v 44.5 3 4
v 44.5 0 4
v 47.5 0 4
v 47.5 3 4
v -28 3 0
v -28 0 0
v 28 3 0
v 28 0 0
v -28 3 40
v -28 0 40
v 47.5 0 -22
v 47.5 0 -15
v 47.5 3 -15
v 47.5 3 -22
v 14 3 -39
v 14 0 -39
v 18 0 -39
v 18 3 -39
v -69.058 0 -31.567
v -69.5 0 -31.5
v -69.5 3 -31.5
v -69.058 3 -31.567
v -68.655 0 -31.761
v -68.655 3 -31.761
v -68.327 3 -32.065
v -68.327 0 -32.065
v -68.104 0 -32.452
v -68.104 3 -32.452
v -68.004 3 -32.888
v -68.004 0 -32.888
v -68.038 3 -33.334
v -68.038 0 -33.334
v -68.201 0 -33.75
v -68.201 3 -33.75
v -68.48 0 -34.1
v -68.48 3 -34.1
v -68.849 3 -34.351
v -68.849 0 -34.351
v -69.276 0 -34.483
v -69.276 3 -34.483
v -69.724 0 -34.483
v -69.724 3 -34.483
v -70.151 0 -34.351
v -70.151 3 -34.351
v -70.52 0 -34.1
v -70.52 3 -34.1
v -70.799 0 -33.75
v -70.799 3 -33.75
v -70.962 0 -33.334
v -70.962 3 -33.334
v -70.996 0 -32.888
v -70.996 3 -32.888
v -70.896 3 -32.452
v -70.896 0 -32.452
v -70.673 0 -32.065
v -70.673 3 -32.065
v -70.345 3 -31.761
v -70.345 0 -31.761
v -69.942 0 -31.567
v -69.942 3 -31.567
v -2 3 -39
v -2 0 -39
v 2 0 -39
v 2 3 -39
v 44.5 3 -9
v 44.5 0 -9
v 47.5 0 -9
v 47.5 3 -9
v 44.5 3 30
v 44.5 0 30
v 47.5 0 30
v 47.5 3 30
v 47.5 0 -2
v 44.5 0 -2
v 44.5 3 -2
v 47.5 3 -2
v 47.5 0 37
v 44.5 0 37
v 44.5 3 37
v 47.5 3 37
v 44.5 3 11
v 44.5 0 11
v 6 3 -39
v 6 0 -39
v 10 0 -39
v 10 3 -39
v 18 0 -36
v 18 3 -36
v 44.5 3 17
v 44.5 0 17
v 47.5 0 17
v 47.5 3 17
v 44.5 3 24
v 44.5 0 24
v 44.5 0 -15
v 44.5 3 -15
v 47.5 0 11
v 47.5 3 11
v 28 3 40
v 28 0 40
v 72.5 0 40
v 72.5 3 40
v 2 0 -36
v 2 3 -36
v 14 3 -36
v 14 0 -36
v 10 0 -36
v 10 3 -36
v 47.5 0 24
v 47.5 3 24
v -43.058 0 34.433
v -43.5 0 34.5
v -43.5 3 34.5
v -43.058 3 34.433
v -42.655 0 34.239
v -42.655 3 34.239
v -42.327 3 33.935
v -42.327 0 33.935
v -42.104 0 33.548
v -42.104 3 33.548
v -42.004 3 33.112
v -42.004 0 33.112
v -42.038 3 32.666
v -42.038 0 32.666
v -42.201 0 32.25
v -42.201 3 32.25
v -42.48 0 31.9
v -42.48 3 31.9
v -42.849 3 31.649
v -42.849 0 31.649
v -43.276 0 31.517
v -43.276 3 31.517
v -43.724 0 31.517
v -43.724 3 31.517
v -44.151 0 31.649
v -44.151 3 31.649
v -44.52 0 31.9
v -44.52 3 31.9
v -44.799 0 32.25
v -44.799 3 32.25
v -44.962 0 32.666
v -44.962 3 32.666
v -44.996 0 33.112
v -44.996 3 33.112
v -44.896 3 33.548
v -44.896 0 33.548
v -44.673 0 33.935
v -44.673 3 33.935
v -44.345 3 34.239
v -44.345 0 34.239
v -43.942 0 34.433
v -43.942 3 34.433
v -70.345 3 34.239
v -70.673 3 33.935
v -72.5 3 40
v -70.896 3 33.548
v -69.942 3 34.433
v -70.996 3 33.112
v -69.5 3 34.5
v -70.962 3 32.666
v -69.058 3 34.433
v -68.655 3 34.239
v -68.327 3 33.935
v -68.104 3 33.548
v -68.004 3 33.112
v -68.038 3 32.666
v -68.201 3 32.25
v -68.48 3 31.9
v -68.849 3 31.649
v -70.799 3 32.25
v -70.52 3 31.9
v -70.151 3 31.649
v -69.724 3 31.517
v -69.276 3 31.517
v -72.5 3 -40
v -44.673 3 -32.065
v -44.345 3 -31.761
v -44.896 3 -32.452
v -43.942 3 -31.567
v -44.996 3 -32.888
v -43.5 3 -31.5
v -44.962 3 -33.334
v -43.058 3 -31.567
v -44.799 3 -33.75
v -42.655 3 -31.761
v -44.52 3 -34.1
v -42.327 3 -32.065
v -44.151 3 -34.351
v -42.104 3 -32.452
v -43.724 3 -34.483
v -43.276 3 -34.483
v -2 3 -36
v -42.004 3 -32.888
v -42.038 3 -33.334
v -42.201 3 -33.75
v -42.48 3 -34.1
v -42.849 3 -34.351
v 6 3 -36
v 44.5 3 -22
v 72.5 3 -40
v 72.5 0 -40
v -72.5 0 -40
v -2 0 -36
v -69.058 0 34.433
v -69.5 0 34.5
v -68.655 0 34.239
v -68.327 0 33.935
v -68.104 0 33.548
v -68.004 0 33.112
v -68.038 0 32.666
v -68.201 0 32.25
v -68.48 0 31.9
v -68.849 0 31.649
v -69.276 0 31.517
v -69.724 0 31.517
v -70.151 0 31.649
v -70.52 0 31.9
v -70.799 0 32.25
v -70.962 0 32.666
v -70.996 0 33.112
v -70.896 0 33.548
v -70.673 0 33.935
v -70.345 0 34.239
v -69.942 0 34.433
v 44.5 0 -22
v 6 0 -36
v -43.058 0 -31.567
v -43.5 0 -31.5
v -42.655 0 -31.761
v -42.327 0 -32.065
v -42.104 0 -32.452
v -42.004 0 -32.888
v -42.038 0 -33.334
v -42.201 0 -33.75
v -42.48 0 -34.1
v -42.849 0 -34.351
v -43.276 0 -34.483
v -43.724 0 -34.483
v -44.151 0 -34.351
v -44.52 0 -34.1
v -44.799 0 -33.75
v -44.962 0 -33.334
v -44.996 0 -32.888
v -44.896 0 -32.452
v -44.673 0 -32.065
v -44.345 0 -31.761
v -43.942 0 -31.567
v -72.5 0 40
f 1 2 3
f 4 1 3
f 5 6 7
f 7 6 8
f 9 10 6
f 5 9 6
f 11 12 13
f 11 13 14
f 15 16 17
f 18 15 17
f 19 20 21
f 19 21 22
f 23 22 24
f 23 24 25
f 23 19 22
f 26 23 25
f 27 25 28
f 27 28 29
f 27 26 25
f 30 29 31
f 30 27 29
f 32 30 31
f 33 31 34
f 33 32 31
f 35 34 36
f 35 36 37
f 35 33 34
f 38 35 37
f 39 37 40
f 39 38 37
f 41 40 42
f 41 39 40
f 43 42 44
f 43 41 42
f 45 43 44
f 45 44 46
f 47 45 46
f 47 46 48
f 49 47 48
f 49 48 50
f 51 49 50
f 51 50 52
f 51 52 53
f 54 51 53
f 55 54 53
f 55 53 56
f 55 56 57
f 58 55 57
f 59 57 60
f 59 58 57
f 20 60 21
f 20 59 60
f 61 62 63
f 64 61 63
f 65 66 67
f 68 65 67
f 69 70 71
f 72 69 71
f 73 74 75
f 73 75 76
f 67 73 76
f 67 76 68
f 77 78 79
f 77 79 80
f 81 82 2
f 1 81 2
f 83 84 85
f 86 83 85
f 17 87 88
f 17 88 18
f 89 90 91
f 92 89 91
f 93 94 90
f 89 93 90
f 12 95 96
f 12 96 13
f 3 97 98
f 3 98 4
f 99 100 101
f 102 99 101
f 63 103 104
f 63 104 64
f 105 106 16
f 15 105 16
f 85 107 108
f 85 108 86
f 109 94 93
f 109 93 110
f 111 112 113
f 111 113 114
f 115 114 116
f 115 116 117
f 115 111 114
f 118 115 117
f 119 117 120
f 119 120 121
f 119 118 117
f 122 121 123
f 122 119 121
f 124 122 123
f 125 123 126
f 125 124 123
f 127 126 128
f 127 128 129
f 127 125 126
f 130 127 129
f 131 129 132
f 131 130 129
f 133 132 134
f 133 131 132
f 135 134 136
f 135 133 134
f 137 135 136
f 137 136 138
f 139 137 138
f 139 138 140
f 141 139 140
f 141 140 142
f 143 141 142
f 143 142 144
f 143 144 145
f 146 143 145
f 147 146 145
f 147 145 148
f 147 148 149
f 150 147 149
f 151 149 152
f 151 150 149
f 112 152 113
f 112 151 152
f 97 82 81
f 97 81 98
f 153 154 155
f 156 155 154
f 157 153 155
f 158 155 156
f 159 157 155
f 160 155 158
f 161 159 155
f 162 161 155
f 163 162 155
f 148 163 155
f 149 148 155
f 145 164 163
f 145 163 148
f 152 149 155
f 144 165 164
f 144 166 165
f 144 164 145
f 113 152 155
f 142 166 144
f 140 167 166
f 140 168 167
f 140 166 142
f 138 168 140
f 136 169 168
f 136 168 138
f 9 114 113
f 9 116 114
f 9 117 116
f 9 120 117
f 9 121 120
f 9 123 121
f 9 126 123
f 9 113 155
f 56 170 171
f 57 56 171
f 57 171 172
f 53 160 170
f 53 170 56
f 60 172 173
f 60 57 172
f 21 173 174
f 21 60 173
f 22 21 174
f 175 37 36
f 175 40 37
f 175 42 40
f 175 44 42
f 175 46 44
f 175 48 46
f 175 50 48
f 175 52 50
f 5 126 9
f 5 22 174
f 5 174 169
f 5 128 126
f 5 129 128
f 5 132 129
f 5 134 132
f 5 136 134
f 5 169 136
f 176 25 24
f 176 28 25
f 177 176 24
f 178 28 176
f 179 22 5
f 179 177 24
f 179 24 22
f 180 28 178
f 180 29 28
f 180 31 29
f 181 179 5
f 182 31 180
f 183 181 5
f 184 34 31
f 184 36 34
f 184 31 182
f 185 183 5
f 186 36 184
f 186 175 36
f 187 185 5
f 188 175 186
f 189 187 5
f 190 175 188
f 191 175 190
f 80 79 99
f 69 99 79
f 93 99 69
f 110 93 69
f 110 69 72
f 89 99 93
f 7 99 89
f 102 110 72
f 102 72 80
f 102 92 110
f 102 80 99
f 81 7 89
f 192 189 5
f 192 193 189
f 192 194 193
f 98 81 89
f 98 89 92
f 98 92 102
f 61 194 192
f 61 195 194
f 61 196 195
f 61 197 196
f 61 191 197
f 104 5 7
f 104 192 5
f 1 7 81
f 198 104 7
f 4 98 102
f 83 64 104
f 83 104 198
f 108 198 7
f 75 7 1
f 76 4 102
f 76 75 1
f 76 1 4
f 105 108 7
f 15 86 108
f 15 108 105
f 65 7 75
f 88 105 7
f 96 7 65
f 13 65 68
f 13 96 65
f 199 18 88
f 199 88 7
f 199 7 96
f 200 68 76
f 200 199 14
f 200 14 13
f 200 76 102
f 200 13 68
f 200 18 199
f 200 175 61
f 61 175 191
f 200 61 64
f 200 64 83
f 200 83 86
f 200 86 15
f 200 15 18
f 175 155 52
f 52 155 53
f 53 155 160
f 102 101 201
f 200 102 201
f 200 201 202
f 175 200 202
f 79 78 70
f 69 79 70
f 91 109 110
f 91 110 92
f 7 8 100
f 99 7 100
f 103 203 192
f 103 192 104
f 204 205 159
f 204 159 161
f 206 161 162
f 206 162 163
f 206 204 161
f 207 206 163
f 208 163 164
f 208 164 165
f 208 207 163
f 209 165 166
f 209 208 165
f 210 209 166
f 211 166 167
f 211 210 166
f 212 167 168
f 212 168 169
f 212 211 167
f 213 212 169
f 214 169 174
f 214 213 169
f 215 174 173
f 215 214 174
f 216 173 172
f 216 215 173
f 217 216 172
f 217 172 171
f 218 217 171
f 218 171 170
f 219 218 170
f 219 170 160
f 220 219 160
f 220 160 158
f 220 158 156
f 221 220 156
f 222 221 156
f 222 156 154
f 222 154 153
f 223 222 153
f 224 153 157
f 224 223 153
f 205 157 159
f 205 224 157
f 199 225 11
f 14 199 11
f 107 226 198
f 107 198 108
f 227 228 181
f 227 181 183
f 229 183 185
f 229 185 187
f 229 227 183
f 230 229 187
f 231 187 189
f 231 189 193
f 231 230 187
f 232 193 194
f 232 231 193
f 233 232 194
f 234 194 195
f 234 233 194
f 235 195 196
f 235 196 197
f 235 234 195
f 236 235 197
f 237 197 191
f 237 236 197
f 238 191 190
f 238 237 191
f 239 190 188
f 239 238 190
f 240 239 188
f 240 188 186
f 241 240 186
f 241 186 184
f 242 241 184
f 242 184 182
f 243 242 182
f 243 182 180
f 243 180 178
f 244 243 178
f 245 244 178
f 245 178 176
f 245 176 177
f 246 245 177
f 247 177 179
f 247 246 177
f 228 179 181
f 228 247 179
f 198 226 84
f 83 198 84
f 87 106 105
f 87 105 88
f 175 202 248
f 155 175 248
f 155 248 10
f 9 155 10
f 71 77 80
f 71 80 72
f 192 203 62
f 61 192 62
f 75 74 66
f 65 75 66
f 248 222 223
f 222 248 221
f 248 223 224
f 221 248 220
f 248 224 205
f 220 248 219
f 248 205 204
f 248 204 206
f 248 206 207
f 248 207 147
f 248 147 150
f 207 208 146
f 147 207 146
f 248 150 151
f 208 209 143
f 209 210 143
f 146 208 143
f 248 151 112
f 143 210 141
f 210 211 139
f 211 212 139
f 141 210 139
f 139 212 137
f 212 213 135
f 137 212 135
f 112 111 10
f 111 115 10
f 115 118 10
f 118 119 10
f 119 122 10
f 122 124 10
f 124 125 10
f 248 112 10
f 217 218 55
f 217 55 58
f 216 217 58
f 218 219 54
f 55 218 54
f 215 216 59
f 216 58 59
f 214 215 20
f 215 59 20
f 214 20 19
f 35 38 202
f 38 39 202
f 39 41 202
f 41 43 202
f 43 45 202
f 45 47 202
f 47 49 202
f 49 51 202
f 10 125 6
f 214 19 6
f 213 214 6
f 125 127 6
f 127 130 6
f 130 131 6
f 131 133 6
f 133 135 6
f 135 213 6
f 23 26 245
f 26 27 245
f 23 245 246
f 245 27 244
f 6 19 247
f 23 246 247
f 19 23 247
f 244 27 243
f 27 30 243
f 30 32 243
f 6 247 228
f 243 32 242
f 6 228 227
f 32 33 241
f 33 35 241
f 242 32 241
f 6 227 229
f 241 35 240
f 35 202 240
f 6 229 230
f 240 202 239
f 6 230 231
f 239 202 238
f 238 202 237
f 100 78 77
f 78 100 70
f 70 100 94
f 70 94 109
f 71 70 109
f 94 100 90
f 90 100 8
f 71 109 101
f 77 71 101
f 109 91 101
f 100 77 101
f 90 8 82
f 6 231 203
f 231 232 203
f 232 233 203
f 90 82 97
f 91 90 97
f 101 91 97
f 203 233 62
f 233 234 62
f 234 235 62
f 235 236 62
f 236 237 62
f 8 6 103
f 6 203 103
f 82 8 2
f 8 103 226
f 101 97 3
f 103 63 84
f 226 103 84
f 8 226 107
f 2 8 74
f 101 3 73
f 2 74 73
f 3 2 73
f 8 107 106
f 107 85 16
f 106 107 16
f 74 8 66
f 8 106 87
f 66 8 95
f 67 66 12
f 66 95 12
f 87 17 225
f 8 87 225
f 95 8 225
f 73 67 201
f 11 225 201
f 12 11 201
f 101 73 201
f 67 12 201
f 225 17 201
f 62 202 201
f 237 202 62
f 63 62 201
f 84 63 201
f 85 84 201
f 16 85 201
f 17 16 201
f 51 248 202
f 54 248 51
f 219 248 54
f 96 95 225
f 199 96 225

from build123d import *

# Parameters (mm, degrees)
SKETCH1_R           = 1.5
SKETCH1_W           = 3
SKETCH1_H           = 7
SKETCH1_W_2         = 4
SKETCH1_H_2         = 3
BOSS_EXTRUDE1_DEPTH = 3


with BuildPart() as part:
    # Sketch1 → Boss-Extrude1 (new body)
    with BuildSketch(Plane(origin=(0, 0, 0), x_dir=(1, 0, 0), z_dir=(0, 1, 0))):
        Polygon((-72.5, -40), (-28, -40), (-28, 0), (28, 0), (28, -40), (72.5, -40), (72.5, 40), (-72.5, 40), align=None)
        with Locations(Location((-69.5, 33, 0), (0, 0, 270))):
            Circle(SKETCH1_R, mode=Mode.SUBTRACT)
        with Locations(Location((-43.5, 33, 0), (0, 0, 270))):
            Circle(SKETCH1_R, mode=Mode.SUBTRACT)
        with Locations(Location((-43.5, -33, 0), (0, 0, 270))):
            Circle(SKETCH1_R, mode=Mode.SUBTRACT)
        with Locations(Location((-69.5, -33, 0), (0, 0, 270))):
            Circle(SKETCH1_R, mode=Mode.SUBTRACT)
        with Locations((46, 5.5)):
            Rectangle(SKETCH1_W, SKETCH1_H, mode=Mode.SUBTRACT)
        with Locations((46, 18.5)):
            Rectangle(SKETCH1_W, SKETCH1_H, mode=Mode.SUBTRACT)
        with Locations((46, -7.5)):
            Rectangle(SKETCH1_W, SKETCH1_H, mode=Mode.SUBTRACT)
        with Locations((46, -20.5)):
            Rectangle(SKETCH1_W, SKETCH1_H, mode=Mode.SUBTRACT)
        with Locations((46, -33.5)):
            Rectangle(SKETCH1_W, SKETCH1_H, mode=Mode.SUBTRACT)
        with Locations((0, 37.5)):
            Rectangle(SKETCH1_W_2, SKETCH1_H_2, mode=Mode.SUBTRACT)
        with Locations((8, 37.5)):
            Rectangle(SKETCH1_W_2, SKETCH1_H_2, mode=Mode.SUBTRACT)
        with Locations((16, 37.5)):
            Rectangle(SKETCH1_W_2, SKETCH1_H_2, mode=Mode.SUBTRACT)
    extrude(amount=BOSS_EXTRUDE1_DEPTH)


solid = part.part
